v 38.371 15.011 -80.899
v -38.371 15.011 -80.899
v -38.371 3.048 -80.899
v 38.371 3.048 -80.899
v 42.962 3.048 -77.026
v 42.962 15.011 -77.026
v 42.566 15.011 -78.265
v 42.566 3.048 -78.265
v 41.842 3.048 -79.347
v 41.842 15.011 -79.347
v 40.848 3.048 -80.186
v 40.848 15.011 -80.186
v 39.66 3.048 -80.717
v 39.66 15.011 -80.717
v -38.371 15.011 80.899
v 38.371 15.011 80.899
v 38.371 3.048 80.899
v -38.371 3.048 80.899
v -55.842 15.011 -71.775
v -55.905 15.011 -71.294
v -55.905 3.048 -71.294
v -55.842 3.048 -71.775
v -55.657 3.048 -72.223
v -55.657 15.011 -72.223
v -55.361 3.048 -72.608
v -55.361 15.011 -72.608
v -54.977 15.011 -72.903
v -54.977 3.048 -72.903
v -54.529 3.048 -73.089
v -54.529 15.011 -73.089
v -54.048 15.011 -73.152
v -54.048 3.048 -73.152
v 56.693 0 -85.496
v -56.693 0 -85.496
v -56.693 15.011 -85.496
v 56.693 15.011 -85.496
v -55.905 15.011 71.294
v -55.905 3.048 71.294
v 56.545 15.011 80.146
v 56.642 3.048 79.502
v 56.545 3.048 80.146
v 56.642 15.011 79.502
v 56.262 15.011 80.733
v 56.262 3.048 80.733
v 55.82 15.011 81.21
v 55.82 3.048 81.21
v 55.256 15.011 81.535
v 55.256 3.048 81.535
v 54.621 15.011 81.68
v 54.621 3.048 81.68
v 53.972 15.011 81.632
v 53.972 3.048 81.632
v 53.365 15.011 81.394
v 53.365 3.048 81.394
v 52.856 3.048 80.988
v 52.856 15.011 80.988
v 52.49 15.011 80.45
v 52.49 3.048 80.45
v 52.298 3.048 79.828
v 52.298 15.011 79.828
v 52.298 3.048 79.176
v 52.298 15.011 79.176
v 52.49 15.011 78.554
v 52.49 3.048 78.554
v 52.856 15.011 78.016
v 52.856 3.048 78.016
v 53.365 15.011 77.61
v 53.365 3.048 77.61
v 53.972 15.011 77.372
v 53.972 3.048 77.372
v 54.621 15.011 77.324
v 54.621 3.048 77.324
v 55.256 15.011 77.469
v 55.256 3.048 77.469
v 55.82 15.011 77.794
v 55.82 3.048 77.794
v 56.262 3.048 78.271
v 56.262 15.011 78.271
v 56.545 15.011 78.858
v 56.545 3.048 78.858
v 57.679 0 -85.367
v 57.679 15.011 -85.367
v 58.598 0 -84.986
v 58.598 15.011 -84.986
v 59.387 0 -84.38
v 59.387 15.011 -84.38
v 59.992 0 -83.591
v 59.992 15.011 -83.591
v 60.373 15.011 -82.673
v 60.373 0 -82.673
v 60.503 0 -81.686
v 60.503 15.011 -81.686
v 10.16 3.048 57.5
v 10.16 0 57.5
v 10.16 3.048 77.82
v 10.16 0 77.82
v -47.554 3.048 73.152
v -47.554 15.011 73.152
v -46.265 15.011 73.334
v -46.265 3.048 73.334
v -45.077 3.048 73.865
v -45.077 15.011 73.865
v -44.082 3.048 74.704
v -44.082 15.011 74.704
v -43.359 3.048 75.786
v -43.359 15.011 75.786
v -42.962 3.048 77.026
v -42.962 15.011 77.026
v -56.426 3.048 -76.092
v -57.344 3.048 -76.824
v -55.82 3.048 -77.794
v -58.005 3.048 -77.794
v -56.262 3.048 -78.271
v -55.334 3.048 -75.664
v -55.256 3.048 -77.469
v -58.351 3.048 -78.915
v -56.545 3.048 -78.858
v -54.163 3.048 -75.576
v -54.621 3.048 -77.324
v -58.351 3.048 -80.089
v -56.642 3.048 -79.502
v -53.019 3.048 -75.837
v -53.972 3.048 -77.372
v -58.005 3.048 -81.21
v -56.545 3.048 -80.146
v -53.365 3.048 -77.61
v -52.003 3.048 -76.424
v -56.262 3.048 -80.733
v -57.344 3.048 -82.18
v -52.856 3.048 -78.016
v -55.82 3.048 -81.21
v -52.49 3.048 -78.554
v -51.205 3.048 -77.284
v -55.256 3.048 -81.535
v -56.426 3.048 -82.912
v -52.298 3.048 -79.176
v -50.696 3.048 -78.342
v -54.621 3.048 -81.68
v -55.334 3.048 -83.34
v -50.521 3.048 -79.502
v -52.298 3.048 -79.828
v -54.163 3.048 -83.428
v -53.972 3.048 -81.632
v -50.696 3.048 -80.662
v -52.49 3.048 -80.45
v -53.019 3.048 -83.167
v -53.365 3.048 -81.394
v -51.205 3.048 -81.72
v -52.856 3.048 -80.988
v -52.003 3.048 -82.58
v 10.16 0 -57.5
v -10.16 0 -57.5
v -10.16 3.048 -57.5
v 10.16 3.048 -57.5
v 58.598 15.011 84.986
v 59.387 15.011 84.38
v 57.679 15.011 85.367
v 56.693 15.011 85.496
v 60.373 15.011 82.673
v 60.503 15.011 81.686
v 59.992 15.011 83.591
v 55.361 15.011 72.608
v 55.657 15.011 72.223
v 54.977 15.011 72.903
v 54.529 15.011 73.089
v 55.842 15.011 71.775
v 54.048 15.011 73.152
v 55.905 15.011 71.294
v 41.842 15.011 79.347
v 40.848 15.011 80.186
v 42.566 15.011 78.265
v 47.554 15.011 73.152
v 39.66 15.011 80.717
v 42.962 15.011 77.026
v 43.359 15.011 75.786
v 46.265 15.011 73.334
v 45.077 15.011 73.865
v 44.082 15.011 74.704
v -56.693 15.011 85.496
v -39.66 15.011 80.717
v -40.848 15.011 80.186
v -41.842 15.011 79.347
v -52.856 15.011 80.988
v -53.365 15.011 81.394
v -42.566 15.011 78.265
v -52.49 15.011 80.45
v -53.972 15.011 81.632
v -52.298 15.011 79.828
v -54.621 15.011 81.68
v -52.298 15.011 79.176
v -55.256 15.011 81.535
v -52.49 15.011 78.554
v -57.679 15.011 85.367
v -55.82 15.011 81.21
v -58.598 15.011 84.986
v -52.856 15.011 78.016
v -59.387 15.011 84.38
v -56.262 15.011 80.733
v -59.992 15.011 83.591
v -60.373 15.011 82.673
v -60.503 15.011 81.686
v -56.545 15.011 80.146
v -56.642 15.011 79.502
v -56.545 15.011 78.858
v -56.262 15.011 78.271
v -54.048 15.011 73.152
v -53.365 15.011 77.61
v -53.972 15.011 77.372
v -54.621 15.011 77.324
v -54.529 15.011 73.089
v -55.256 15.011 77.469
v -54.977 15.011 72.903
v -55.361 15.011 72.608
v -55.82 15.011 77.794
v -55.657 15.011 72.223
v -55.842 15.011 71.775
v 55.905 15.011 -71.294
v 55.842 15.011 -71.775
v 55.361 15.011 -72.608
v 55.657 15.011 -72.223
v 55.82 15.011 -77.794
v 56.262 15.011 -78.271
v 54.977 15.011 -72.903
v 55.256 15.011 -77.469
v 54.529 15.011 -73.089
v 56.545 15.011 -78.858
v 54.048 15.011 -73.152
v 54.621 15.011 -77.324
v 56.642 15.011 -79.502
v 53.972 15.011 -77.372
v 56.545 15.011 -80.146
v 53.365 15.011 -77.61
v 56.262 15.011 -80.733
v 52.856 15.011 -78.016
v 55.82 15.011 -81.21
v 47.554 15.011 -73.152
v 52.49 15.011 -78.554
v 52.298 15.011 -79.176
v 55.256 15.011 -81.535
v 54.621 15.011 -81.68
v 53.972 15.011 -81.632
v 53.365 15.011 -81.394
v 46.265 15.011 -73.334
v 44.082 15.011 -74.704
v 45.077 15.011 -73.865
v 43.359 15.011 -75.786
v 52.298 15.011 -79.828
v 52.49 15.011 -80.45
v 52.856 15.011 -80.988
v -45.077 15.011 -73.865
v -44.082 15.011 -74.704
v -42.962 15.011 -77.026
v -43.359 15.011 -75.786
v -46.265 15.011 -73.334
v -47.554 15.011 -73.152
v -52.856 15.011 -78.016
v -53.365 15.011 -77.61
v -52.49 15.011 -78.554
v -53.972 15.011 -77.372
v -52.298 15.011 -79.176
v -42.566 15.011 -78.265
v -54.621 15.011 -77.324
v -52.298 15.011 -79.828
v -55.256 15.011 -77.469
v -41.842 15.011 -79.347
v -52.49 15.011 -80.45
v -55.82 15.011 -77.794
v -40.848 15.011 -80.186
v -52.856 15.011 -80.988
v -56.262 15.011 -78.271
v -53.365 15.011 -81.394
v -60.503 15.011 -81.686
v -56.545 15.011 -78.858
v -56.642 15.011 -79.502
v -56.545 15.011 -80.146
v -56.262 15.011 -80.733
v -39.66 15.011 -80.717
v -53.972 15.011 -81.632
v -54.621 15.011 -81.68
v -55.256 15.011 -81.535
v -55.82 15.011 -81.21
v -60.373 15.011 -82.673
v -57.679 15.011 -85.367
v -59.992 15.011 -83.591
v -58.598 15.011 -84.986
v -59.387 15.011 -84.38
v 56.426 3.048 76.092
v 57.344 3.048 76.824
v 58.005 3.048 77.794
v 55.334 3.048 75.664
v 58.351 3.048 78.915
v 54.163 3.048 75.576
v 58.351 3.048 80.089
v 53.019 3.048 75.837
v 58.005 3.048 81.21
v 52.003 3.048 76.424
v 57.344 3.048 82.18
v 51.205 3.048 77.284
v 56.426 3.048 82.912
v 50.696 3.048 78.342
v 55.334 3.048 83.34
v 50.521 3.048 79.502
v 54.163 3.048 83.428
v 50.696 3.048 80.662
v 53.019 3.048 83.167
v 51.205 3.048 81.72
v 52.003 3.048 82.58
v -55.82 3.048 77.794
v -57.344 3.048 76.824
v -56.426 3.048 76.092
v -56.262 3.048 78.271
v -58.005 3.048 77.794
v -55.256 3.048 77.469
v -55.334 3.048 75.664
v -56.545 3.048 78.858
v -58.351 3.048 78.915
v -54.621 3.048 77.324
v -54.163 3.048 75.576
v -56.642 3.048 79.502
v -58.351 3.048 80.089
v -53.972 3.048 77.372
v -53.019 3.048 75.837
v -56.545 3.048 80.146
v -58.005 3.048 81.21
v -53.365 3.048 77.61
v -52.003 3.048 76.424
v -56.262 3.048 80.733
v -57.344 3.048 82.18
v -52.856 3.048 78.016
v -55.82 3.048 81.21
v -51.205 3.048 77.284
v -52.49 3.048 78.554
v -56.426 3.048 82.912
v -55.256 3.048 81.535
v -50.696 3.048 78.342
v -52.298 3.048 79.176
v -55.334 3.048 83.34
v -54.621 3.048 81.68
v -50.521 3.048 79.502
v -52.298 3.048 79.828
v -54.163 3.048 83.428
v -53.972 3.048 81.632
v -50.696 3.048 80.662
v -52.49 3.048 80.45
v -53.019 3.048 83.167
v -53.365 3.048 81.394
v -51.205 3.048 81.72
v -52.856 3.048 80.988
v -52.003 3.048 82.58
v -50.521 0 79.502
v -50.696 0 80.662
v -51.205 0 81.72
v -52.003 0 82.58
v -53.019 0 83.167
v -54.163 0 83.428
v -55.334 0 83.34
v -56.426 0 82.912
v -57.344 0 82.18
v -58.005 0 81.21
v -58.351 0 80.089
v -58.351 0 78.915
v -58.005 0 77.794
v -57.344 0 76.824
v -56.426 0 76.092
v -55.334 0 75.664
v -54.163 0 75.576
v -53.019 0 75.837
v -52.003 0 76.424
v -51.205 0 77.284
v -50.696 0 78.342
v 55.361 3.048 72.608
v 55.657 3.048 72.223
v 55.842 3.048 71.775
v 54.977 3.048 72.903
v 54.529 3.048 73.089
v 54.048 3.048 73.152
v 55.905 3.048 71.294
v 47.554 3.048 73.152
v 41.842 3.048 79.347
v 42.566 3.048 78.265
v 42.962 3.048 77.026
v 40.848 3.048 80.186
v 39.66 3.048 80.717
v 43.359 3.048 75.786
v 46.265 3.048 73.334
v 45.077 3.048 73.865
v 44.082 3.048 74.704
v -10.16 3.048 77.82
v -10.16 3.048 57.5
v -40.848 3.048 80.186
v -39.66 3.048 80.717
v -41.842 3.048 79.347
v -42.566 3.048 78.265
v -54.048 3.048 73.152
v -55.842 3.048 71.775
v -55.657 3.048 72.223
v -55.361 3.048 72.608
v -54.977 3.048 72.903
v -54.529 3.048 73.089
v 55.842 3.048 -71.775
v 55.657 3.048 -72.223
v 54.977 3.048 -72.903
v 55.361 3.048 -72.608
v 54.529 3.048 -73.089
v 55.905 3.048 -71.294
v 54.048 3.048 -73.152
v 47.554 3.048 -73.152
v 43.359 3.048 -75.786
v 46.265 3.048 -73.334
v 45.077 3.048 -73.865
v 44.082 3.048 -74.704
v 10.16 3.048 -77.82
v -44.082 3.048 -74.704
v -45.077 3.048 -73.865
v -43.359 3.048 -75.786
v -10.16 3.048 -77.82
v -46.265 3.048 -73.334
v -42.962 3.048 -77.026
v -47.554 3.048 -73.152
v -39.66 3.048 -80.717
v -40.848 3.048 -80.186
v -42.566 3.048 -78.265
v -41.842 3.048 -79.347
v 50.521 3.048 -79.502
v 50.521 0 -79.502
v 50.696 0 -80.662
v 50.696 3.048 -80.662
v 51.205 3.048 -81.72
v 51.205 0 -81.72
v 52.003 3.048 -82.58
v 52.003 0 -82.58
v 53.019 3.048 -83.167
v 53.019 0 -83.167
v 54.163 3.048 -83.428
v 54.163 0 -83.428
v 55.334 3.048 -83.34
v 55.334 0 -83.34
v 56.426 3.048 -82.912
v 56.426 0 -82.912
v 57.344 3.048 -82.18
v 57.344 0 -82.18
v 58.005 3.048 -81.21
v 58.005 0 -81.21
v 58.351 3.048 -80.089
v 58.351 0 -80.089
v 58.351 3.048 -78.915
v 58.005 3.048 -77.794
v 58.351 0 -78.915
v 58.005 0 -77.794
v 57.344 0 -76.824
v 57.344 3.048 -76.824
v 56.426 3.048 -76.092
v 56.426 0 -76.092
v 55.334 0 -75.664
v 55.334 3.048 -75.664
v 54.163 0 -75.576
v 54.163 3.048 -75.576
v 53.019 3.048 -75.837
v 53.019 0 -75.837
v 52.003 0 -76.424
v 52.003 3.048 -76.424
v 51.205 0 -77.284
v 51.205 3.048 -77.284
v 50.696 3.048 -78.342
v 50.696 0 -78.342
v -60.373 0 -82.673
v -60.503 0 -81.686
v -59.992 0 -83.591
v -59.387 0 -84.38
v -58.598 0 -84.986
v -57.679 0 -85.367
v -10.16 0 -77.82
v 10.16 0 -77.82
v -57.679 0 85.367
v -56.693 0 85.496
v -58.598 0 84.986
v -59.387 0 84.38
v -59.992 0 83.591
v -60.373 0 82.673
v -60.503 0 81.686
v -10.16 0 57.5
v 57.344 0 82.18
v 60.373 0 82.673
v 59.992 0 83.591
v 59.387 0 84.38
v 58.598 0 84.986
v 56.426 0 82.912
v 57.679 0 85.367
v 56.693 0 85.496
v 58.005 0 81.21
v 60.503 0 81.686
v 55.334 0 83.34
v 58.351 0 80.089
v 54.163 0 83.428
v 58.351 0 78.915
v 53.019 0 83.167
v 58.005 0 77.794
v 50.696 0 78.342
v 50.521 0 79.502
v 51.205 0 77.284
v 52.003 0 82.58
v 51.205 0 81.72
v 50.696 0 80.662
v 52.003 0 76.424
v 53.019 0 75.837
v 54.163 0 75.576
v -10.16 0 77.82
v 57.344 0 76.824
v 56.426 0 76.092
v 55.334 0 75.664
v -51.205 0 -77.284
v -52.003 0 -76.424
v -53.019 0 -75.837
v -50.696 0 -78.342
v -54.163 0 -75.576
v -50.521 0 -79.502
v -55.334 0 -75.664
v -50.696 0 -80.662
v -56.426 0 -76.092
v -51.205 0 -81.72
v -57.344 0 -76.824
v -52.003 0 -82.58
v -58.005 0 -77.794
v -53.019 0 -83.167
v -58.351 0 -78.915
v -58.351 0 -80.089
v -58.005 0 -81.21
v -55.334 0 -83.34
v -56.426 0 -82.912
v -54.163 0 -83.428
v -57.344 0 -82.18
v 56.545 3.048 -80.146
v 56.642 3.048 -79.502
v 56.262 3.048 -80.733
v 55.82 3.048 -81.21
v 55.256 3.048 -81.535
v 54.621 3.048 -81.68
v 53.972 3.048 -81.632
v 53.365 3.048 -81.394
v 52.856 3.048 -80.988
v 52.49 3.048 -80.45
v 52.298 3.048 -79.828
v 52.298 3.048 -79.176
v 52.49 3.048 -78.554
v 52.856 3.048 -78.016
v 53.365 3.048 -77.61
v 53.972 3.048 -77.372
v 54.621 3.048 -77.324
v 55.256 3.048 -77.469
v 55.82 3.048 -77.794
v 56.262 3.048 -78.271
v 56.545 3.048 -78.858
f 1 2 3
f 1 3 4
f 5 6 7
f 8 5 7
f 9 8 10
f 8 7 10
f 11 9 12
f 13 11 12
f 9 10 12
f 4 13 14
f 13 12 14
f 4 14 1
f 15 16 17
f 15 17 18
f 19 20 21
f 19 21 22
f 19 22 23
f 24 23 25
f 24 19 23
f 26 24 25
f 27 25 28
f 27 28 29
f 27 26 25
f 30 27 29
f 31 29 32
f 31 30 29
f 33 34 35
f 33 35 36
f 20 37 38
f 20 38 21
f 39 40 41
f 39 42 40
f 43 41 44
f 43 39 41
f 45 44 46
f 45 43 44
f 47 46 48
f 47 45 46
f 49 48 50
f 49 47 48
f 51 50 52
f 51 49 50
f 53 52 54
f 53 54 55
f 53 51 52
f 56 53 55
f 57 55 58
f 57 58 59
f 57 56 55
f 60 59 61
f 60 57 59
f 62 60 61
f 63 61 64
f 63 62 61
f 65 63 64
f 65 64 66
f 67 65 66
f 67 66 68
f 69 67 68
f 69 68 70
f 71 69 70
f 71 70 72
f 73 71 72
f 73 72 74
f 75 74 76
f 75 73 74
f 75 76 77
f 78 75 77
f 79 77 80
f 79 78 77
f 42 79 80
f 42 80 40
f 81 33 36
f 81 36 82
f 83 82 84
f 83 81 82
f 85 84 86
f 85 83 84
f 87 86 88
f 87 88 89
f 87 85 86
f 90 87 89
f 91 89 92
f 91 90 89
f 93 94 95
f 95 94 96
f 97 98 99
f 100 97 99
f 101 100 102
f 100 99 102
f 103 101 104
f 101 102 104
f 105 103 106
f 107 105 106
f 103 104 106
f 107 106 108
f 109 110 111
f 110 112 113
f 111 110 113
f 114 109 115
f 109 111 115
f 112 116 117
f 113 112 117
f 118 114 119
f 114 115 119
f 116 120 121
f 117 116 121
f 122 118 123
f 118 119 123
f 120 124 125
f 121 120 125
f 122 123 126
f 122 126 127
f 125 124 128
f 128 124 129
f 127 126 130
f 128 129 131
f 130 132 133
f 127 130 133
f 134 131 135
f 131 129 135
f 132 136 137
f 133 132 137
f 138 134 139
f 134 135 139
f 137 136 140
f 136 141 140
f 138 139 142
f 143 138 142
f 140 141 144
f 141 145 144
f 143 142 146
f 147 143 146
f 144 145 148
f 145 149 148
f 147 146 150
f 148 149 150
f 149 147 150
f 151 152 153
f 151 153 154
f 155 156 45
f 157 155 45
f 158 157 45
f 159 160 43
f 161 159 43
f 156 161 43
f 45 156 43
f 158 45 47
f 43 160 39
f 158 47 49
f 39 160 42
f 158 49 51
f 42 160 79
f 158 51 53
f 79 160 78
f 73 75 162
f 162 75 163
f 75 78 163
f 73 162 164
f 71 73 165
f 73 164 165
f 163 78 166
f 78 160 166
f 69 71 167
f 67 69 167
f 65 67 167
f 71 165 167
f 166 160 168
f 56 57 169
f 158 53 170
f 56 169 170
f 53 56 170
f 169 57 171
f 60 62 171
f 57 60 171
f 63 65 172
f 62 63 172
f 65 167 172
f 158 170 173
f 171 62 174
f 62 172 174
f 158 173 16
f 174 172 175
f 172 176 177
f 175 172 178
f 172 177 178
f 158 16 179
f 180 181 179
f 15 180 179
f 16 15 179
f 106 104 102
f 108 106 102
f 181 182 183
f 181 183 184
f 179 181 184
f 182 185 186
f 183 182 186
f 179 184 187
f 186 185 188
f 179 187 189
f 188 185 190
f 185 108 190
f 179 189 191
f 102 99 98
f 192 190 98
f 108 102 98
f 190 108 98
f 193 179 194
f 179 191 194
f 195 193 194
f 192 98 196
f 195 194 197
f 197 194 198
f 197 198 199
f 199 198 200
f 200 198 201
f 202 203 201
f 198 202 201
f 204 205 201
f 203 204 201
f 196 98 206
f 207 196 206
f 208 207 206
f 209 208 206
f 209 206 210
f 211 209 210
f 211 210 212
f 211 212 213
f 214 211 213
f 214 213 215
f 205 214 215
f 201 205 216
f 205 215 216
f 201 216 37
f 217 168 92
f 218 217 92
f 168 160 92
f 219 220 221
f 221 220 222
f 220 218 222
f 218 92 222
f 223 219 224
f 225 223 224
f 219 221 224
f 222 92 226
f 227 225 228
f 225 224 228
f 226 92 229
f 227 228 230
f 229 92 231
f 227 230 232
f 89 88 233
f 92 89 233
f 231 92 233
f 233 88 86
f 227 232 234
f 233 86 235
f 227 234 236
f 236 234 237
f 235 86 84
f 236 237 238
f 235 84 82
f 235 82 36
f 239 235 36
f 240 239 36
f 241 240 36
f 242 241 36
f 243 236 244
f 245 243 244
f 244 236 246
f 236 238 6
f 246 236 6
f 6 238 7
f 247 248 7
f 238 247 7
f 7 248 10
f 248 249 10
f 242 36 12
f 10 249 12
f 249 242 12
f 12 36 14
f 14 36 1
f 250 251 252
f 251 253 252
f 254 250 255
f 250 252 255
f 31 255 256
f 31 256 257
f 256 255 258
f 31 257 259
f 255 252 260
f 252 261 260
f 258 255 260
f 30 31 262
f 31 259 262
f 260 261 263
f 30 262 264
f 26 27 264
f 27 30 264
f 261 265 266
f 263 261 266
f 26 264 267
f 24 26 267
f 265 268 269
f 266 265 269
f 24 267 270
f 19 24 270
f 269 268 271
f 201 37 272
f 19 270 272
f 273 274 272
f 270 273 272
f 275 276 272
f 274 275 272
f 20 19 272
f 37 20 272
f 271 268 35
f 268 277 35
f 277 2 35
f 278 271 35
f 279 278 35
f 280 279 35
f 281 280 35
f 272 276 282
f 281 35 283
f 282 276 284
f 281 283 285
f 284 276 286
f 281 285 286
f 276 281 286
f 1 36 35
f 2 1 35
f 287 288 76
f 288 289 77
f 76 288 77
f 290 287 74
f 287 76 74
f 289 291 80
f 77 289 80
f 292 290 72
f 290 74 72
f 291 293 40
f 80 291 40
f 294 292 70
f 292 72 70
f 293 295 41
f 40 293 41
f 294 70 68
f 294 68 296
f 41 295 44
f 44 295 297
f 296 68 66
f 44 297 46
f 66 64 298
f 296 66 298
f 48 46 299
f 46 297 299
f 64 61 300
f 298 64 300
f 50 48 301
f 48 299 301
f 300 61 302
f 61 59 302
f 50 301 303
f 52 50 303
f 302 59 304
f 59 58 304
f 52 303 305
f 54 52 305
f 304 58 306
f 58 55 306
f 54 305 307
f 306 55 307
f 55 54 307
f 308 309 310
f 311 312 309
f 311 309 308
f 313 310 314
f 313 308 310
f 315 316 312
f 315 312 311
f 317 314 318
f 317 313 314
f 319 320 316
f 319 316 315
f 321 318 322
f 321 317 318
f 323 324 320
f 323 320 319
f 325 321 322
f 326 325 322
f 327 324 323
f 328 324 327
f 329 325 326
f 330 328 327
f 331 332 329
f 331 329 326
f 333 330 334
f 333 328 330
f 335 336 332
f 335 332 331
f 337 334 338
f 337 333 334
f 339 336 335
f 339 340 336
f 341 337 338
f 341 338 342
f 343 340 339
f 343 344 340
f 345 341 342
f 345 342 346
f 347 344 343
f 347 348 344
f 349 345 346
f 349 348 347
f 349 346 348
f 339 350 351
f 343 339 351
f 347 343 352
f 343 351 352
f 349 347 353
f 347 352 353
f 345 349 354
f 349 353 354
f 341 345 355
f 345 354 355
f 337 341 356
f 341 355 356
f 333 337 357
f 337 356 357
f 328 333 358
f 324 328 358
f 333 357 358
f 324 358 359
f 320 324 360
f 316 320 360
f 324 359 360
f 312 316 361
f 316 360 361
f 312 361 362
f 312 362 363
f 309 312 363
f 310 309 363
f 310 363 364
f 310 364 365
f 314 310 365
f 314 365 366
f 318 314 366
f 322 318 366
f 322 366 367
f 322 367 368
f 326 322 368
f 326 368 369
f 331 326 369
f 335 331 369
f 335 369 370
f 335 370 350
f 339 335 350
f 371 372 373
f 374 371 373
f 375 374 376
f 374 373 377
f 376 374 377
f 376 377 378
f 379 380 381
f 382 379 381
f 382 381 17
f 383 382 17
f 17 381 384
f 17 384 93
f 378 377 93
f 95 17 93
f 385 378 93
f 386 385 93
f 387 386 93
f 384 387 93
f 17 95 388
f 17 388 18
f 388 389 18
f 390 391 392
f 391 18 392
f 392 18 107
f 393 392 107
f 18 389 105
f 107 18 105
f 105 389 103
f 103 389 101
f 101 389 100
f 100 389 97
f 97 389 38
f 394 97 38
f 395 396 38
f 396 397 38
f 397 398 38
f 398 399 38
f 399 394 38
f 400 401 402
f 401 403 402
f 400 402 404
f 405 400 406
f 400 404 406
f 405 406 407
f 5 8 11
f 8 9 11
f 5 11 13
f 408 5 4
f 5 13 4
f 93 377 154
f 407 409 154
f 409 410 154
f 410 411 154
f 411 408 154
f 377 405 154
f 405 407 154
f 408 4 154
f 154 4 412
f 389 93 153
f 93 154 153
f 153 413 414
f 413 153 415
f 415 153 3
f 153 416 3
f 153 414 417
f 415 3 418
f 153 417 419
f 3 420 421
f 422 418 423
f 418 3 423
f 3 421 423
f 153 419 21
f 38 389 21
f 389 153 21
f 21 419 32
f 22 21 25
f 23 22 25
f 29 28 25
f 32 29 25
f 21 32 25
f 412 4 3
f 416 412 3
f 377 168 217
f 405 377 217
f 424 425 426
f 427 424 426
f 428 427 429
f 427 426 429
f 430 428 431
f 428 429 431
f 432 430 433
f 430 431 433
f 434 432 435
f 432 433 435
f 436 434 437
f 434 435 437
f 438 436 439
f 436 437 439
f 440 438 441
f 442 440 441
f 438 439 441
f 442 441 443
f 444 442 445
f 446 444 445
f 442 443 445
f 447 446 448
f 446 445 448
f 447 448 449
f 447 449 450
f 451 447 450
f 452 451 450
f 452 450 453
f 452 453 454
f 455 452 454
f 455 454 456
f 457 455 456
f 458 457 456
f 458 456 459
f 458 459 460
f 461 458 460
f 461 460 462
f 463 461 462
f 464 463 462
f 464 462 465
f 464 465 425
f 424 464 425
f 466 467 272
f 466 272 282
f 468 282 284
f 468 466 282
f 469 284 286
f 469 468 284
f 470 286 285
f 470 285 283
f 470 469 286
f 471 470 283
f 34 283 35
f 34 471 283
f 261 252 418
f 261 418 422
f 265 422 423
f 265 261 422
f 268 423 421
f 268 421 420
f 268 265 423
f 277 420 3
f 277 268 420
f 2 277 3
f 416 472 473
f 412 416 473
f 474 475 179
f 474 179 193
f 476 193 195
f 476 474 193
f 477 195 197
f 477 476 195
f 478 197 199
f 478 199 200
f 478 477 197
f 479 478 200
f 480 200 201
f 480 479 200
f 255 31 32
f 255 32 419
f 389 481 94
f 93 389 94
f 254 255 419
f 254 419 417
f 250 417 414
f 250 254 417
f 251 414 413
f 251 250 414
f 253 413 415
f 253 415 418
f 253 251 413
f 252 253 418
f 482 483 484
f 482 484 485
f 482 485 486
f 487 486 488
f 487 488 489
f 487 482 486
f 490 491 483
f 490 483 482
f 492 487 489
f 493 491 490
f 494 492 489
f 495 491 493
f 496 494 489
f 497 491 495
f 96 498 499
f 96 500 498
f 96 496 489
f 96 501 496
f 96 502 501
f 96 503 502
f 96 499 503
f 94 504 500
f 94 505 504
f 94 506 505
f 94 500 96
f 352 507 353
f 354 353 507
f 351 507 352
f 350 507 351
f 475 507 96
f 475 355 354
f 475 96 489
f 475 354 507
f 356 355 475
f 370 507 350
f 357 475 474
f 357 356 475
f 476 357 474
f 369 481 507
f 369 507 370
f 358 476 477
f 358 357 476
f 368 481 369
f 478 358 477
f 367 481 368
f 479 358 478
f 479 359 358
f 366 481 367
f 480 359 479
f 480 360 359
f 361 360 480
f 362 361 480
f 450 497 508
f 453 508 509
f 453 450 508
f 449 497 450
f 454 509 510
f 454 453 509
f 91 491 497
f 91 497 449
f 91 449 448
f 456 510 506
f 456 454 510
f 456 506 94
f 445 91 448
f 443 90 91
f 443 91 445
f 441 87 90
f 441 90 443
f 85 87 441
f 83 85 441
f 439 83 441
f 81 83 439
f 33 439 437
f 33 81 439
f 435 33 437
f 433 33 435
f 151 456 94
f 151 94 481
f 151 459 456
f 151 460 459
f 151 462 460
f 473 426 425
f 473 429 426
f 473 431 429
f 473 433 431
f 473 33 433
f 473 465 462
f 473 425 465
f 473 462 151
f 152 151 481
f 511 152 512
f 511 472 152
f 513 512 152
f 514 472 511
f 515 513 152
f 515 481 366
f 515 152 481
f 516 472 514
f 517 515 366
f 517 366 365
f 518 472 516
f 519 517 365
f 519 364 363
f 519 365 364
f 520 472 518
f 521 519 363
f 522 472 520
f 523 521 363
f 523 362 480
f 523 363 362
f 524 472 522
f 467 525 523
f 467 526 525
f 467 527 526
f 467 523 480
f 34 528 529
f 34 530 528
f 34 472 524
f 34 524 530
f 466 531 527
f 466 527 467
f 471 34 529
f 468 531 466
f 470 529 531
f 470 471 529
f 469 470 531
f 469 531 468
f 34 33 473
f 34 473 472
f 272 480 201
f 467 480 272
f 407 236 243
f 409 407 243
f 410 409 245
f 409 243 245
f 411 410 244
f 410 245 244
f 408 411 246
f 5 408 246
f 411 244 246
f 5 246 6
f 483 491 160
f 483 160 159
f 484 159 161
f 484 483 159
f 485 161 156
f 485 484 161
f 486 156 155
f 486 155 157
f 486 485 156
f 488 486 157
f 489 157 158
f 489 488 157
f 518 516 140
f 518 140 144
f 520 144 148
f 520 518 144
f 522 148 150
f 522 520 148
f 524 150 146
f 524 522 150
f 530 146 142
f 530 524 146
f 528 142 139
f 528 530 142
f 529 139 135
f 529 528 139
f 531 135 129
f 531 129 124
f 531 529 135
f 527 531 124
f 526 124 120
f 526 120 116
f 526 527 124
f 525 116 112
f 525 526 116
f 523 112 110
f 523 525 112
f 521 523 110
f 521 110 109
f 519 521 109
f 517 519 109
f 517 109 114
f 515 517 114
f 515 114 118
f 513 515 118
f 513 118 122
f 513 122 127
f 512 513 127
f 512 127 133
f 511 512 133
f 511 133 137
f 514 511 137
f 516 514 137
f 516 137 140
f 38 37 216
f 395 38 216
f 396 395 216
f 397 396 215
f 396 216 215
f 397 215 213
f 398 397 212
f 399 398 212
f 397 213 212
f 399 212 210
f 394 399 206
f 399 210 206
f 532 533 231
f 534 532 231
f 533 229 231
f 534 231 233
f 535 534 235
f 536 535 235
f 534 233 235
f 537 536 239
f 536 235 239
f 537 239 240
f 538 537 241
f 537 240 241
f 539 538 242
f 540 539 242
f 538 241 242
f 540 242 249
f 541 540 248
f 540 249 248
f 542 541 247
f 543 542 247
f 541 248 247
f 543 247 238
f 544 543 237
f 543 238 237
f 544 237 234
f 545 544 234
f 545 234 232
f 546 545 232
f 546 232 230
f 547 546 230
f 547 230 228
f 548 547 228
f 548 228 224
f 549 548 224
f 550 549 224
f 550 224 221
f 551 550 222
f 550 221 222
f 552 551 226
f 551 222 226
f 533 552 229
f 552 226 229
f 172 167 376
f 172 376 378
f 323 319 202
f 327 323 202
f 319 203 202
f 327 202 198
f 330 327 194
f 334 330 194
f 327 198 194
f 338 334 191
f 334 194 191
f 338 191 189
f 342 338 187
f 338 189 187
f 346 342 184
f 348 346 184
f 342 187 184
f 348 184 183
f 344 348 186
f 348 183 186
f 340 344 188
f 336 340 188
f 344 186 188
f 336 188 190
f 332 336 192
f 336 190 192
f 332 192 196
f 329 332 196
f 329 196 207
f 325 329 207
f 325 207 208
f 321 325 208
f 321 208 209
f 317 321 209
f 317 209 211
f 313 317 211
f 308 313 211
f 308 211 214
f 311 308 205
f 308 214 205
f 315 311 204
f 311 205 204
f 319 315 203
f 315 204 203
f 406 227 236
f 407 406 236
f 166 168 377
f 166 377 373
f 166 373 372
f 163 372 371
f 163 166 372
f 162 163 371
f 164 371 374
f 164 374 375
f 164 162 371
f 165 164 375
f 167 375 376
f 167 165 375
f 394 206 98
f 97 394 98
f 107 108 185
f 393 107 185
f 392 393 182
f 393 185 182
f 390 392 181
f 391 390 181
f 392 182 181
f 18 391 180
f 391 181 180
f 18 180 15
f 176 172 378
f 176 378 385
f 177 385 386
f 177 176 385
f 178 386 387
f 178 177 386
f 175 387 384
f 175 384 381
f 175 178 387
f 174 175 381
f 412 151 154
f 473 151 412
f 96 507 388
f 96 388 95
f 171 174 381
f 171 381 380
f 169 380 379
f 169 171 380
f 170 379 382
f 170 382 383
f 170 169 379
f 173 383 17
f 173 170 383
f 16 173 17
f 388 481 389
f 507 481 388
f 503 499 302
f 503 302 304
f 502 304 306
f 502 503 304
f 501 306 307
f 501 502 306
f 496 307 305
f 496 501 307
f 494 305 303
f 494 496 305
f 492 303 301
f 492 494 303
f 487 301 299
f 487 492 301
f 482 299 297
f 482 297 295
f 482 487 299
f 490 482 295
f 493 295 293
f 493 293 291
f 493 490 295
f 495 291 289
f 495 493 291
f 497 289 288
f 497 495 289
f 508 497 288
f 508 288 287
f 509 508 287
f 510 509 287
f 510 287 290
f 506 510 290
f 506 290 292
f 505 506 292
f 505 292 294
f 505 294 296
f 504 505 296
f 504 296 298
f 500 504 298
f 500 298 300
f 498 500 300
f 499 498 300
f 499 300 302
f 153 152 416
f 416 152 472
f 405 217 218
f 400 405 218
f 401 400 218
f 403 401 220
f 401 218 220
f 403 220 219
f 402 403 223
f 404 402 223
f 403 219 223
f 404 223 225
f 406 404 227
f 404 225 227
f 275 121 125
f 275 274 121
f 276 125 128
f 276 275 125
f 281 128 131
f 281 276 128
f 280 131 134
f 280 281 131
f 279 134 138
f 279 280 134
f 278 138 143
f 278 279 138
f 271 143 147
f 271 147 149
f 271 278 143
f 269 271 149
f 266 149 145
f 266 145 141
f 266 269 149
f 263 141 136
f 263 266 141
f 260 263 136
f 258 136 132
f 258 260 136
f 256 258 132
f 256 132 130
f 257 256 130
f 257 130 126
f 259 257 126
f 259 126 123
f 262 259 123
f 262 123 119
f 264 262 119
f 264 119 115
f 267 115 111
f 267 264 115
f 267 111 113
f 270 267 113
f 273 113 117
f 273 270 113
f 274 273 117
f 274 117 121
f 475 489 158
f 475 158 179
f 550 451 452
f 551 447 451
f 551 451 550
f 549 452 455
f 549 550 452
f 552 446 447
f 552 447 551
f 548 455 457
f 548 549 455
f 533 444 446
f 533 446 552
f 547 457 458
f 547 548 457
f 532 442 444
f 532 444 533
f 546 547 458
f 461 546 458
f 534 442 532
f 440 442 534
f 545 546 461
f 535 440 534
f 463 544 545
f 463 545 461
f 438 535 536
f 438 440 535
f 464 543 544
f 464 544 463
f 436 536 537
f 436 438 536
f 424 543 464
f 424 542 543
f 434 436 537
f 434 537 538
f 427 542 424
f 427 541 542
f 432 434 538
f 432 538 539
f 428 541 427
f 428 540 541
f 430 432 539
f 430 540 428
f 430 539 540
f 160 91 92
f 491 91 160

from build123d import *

# Parameters (mm, degrees)
BOSS_EXTRUDE1_DEPTH                                 = 15.0114
CUT_EXTRUDE1_DEPTH                                  = 11.9634
MIRROR2_COPY_1_DEPTH                                = 11.9634
CBORE_SLOT_FOR_3_BINDING_HEAD_MACHINE_S_D           = 4.3688
CBORE_SLOT_FOR_3_BINDING_HEAD_MACHINE_S_CBORE_D     = 7.874
CBORE_SLOT_FOR_3_BINDING_HEAD_MACHINE_S_CBORE_DEPTH = 3.048
MIRROR4_COPY_1_D                                    = 4.3688
MIRROR4_COPY_1_CBORE_D                              = 7.874
MIRROR4_COPY_1_CBORE_DEPTH                          = 3.048
SKETCH10_W                                          = 20.32
SKETCH10_H                                          = 20.32
CUT_EXTRUDE3_DEPTH                                  = 3.048


with BuildPart() as part:
    # Sketch2 → Boss-Extrude1 (new body)
    with BuildSketch(Plane(origin=(0, 0, 0), x_dir=(1, 0, 0), z_dir=(0, 1, 0))):
        with BuildLine():
            Line((56.6928, -85.4964), (-56.6928, -85.4964))
            ThreePointArc((-56.6928, -85.4964), (-59.386876836, -84.380476836), (-60.5028, -81.6864))
            Line((-60.5028, -81.6864), (-60.5028, 81.6864))
            ThreePointArc((-60.5028, 81.6864), (-59.386876836, 84.380476836), (-56.6928, 85.4964))
            Line((-56.6928, 85.4964), (56.6928, 85.4964))
            ThreePointArc((56.6928, 85.4964), (59.386876836, 84.380476836), (60.5028, 81.6864))
            Line((60.5028, 81.6864), (60.5028, -81.6864))
            ThreePointArc((60.5028, -81.6864), (59.386876836, -84.380476836), (56.6928, -85.4964))
        make_face()
    extrude(amount=BOSS_EXTRUDE1_DEPTH)

    # Sketch3 → Cut-Extrude1 (cut)
    with BuildSketch(Plane(origin=(0, 15.0114, 0), x_dir=(1, 0, 0), z_dir=(0, 1, 0))):
        with BuildLine():
            Line((-55.9054, 0), (-55.9054, 71.294481899))
            ThreePointArc((-55.9054, 71.294481899), (-55.361345544, 72.607945544), (-54.047881899, 73.152))
            Line((-54.047881899, 73.152), (-47.553880656, 73.152))
            ThreePointArc((-47.553880656, 73.152), (-44.550315934, 74.249721203), (-42.962410096, 77.0255))
            ThreePointArc((-42.962410096, 77.0255), (-41.374504259, 79.801278797), (-38.370939537, 80.899))
            Line((-38.370939537, 80.899), (0, 80.899))
            Line((0, 80.899), (0, 0))
            Line((0, 0), (-55.9054, 0))
        make_face()
    cut_extrude1 = extrude(amount=-CUT_EXTRUDE1_DEPTH, mode=Mode.SUBTRACT)

    # Mirror1: Cut-Extrude1 across plane
    add(cut_extrude1.mirror(Plane(origin=(0, 0, 0), x_dir=(0, 0, 1), z_dir=(1, 0, 0))), mode=Mode.SUBTRACT)

    # Mirror2: Cut-Extrude1 across plane
    add(cut_extrude1.mirror(Plane.XY), mode=Mode.SUBTRACT)

    # Mirror2 copy 1 sketch → Mirror2 copy 1 (cut)
    with BuildSketch(Plane(origin=(0, 15.0114, 0), x_dir=(-1, 0, 0), z_dir=(0, 1, 0))):
        with BuildLine():
            Line((-55.9054, 0), (-55.9054, 71.294481899))
            ThreePointArc((-55.9054, 71.294481899), (-55.361345544, 72.607945544), (-54.047881899, 73.152))
            Line((-54.047881899, 73.152), (-47.553880656, 73.152))
            ThreePointArc((-47.553880656, 73.152), (-44.550315934, 74.249721203), (-42.962410096, 77.0255))
            ThreePointArc((-42.962410096, 77.0255), (-41.374504259, 79.801278797), (-38.370939537, 80.899))
            Line((-38.370939537, 80.899), (0, 80.899))
            Line((0, 80.899), (0, 0))
            Line((0, 0), (-55.9054, 0))
        make_face()
    extrude(amount=-MIRROR2_COPY_1_DEPTH, mode=Mode.SUBTRACT)

    # CBORE SLOT for #3 Binding Head Machine Screw1 (through all)
    with Locations(Plane(origin=(0, 0, 0), x_dir=(-1, 0, 0), z_dir=(0, -1, 0))):
        with Locations((-54.4576, 79.502)):
            cbore_slot_for_3_binding_head_machine_s = CounterBoreHole(CBORE_SLOT_FOR_3_BINDING_HEAD_MACHINE_S_D / 2, CBORE_SLOT_FOR_3_BINDING_HEAD_MACHINE_S_CBORE_D / 2, CBORE_SLOT_FOR_3_BINDING_HEAD_MACHINE_S_CBORE_DEPTH)

    # Mirror3: CBORE SLOT for #3 Binding Head Machine Screw1 across plane
    add(cbore_slot_for_3_binding_head_machine_s.mirror(Plane(origin=(0, 0, 0), x_dir=(0, 0, 1), z_dir=(1, 0, 0))), mode=Mode.SUBTRACT)

    # Mirror4: CBORE SLOT for #3 Binding Head Machine Screw1 across plane
    add(cbore_slot_for_3_binding_head_machine_s.mirror(Plane.XY), mode=Mode.SUBTRACT)

    # Mirror4 copy 1 (through all)
    with Locations(Plane.XZ):
        with Locations((-54.4576, 79.502)):
            CounterBoreHole(MIRROR4_COPY_1_D / 2, MIRROR4_COPY_1_CBORE_D / 2, MIRROR4_COPY_1_CBORE_DEPTH)

    # Sketch10 → Cut-Extrude3 (cut)
    with BuildSketch(Plane.XZ):
        with Locations((0, 67.66)):
            Rectangle(SKETCH10_W, SKETCH10_H)
    cut_extrude3 = extrude(amount=-CUT_EXTRUDE3_DEPTH, mode=Mode.SUBTRACT)

    # Mirror7: Cut-Extrude3 across plane
    add(cut_extrude3.mirror(Plane.XY), mode=Mode.SUBTRACT)


solid = part.part
